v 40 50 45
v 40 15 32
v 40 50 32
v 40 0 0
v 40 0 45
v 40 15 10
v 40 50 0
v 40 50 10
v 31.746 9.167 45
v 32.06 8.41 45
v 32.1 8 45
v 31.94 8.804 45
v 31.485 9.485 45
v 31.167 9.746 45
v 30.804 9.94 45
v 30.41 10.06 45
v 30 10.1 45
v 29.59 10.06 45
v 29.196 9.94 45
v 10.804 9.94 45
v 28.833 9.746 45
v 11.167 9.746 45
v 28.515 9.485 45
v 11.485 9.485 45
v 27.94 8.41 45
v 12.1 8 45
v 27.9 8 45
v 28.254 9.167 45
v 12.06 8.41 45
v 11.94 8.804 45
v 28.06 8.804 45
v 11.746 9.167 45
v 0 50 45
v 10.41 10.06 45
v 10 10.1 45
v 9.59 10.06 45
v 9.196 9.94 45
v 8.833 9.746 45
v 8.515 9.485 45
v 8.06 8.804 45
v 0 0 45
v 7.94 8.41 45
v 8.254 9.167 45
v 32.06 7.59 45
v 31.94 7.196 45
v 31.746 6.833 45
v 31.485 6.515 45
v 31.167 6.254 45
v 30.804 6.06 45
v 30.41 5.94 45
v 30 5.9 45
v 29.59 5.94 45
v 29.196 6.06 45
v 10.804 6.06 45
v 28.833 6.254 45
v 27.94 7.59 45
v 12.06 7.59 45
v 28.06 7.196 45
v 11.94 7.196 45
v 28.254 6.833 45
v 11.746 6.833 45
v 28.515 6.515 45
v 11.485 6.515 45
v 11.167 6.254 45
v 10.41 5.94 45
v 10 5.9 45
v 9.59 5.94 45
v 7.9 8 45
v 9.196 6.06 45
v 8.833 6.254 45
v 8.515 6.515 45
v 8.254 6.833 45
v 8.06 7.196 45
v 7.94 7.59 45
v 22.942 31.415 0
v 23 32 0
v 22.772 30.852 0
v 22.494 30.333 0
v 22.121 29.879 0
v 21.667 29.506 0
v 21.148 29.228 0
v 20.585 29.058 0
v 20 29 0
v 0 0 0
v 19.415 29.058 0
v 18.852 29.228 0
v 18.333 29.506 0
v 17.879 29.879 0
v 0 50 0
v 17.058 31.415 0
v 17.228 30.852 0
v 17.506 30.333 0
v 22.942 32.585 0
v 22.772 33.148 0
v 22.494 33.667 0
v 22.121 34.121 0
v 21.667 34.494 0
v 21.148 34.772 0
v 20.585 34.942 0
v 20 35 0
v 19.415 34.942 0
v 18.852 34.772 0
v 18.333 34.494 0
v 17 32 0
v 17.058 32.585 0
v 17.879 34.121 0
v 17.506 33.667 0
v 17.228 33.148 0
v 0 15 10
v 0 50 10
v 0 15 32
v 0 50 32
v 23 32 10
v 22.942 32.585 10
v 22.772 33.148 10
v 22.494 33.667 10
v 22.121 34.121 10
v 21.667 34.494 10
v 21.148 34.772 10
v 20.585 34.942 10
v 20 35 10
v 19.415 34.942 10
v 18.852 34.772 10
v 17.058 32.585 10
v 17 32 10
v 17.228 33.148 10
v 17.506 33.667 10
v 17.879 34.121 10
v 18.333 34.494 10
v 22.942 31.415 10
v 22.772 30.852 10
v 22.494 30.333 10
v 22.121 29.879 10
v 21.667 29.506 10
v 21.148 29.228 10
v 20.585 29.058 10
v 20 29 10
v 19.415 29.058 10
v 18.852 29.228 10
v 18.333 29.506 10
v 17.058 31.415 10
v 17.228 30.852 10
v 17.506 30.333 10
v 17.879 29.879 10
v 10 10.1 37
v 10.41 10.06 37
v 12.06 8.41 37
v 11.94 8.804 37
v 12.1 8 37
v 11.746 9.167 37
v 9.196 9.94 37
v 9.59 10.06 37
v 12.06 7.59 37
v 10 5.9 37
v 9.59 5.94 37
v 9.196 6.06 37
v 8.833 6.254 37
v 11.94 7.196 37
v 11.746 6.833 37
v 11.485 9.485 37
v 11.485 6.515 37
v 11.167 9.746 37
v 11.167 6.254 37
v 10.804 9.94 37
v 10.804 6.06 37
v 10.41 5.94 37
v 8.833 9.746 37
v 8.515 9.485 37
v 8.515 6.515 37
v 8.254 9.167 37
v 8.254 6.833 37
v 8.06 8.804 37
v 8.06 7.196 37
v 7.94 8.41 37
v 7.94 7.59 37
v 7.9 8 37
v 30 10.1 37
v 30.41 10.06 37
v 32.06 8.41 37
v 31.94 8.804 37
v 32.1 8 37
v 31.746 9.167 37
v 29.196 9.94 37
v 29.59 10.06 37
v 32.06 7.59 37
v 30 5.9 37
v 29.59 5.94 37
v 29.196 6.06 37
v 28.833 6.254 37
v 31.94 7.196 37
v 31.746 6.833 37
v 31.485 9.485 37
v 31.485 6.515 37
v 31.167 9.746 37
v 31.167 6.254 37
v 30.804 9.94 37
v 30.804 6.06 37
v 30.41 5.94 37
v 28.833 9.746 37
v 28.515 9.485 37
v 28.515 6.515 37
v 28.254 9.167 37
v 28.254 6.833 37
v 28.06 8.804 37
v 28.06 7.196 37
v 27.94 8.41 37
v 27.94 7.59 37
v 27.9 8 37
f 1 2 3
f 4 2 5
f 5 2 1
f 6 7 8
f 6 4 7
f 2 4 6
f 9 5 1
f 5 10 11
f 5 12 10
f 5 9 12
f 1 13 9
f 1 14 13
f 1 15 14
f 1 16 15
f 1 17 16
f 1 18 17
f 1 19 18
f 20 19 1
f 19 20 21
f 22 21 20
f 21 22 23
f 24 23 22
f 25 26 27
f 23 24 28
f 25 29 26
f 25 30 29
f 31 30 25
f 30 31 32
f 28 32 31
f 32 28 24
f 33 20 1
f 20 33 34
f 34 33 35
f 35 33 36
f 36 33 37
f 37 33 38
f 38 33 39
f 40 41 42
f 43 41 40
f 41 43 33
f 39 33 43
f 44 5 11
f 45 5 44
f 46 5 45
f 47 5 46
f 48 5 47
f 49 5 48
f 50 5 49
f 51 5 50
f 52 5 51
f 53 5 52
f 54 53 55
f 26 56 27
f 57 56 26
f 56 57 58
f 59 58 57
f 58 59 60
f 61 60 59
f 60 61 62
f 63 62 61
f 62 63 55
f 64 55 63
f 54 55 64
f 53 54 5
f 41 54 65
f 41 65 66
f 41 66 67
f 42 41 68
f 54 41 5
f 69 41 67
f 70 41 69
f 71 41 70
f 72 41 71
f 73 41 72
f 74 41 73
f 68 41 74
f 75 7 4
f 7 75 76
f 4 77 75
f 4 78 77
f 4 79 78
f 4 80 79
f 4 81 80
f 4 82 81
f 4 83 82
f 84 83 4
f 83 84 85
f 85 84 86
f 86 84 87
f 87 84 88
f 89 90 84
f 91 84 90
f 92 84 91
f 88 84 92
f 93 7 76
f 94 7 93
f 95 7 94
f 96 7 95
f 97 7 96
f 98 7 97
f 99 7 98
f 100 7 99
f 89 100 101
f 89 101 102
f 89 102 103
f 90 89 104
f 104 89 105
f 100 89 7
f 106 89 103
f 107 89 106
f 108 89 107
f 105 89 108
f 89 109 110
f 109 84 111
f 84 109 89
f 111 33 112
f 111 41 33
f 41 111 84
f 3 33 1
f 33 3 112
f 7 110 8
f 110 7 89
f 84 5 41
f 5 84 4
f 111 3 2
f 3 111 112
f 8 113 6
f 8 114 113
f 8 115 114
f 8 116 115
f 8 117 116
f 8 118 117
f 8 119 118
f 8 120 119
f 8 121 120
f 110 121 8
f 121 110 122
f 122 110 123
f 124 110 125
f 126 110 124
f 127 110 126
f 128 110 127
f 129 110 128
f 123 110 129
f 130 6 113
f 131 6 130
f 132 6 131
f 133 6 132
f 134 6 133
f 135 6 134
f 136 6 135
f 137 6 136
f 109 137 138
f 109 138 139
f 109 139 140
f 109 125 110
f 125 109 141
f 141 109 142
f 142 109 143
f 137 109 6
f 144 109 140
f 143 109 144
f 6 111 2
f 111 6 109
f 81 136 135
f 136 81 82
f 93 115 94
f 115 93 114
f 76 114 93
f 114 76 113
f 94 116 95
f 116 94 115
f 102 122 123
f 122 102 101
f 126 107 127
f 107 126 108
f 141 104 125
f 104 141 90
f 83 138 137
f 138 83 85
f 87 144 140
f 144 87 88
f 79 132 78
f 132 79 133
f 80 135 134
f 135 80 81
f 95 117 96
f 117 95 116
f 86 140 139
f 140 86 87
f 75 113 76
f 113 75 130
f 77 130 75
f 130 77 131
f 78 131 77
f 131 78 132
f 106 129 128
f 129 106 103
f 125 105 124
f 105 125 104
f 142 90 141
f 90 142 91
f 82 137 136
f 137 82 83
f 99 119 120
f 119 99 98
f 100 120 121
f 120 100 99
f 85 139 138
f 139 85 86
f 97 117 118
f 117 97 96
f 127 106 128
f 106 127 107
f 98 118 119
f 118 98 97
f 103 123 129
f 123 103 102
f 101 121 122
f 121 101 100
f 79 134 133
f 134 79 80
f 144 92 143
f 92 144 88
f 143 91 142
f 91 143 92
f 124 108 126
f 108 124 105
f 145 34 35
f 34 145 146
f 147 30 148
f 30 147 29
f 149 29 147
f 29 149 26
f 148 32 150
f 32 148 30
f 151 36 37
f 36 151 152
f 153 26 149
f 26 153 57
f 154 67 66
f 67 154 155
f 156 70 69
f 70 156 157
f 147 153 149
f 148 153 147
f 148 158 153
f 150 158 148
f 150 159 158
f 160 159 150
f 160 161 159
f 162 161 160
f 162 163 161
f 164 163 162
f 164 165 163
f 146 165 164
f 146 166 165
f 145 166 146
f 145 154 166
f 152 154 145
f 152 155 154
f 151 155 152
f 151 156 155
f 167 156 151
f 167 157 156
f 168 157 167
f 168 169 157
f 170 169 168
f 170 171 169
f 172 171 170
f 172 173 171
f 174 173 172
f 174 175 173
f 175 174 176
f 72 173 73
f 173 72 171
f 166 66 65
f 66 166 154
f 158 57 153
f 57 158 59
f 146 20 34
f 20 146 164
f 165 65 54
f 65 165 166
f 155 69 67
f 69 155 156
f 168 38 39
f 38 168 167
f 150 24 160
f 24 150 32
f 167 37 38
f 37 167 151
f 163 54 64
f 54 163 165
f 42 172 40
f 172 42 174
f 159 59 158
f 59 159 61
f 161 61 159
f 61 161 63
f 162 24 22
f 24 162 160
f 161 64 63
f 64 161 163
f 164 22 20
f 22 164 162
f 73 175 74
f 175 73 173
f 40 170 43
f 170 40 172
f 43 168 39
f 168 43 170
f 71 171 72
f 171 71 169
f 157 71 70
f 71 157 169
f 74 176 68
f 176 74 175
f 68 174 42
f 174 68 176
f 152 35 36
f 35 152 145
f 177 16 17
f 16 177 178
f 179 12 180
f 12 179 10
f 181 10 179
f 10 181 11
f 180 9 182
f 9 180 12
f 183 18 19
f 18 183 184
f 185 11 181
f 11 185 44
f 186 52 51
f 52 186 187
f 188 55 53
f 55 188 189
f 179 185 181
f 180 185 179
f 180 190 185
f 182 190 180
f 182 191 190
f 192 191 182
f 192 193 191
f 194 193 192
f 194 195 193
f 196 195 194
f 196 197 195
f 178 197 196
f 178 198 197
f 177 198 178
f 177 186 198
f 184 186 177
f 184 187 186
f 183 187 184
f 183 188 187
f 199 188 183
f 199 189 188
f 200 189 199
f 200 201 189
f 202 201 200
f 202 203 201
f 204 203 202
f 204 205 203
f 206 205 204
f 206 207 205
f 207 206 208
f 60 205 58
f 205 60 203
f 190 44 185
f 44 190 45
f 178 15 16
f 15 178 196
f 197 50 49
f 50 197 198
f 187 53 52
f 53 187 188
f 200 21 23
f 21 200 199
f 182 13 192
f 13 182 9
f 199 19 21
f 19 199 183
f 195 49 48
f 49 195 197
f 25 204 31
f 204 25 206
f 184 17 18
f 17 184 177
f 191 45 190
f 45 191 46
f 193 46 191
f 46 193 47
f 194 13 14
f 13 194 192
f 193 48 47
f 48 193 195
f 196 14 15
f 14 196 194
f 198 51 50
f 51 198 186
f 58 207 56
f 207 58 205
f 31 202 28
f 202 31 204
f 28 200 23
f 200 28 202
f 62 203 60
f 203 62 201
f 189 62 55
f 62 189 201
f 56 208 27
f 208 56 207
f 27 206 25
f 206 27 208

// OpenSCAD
// PROJECT W.A.L.L. - Mechanical Edge Clamp Adapter
// Clamps corner winch onto extrusion rails or wooden board edges
$fn = 32;

clamp_w = 40.0;
clamp_d = 50.0;
clamp_h = 45.0;
jaw_gap = 22.0; // Fits up to 20mm board or 2020 extrusion

module frame_clamp() {
    difference() {
        cube([clamp_w, clamp_d, clamp_h]);

        // C-clamp cutout
        translate([-1, 15, 10])
            cube([clamp_w + 2, clamp_d, jaw_gap]);

        // Clamping screw threaded hole (M6)
        translate([clamp_w/2, 32, -1])
            cylinder(d=6.0, h=12);

        // Winch bracket attachment holes
        translate([10, 8, clamp_h - 8])
            cylinder(d=4.2, h=10);
        translate([clamp_w - 10, 8, clamp_h - 8])
            cylinder(d=4.2, h=10);
    }
}

frame_clamp();
